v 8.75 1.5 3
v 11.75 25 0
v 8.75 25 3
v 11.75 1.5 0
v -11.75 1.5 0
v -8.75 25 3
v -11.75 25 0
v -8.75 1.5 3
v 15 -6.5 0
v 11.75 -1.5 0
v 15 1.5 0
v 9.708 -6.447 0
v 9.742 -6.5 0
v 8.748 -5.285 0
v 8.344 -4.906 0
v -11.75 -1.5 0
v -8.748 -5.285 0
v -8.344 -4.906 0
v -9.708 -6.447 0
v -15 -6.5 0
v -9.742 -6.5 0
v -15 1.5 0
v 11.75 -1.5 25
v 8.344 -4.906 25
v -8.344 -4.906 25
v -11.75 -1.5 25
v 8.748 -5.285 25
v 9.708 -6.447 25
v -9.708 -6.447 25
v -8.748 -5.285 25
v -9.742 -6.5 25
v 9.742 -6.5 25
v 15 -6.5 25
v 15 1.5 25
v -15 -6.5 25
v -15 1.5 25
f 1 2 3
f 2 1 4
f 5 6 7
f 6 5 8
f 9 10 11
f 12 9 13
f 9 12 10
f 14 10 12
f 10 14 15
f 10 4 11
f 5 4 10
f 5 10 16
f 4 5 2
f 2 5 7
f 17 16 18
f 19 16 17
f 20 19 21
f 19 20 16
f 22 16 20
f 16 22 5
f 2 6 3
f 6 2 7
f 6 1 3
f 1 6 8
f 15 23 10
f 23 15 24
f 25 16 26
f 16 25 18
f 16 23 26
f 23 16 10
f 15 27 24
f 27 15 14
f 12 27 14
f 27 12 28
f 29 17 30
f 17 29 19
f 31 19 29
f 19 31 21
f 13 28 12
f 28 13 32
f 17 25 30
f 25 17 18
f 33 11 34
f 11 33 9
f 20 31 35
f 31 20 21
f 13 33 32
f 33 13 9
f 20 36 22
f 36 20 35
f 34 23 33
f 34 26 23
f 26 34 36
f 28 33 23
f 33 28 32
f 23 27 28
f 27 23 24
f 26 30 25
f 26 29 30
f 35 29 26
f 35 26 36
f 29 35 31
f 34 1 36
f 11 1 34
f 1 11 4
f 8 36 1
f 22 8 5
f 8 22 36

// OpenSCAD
MOUNT_DIA = 130;
MOUNT_THICKNESS = 1;

MOUNT_HOLE_SPACING = 40;
MOUNT_HOLE_DIA = 3.5;

PUMP_DOVE_WIDTH = 23.5;
PUMP_DOVE_LENGTH = 27;
PUMP_DOVE_HEIGHT = 4;
PUMP_DOVE_SIDE = PUMP_DOVE_WIDTH/sqrt(2);

PUMP_DIA = 24;
PUMP_LENGTH = 42;

PUMP_MOUNT_WIDTH = 30;
PUMP_MOUNT_LENGTH = 25;
PUMP_MOUNT_HEIGHT = 5;

PUMP_MOUNT_OFFSET_X = 42;
PUMP_MOUNT_OFFSET_Y = 15;

$fn = 50;

module dove() {
  union() {
    intersection() {
      rotate([0, 45, 0])
      cube(size = [PUMP_DOVE_SIDE, PUMP_DOVE_LENGTH, PUMP_DOVE_SIDE], center = true);

      translate([0, 0, PUMP_DOVE_HEIGHT/2])
      cube(size = [PUMP_DOVE_WIDTH, PUMP_DOVE_LENGTH, PUMP_DOVE_HEIGHT], center = true);
    }

    translate([0, 0, PUMP_DIA/2])
    rotate([90, 0, 0])
    cylinder(d = PUMP_DIA, h = PUMP_LENGTH, center = true);

  }
}

module pump_mount() {
  difference() {
    translate([0, 0, PUMP_MOUNT_HEIGHT/2])
    cube(size = [PUMP_MOUNT_WIDTH, PUMP_MOUNT_LENGTH, PUMP_MOUNT_HEIGHT], center = true);
    dove();
  }
}

module upright_pump_mount() {
  wall_thickness = 3;
  union() {
    translate([0, PUMP_MOUNT_LENGTH/2, 0])
    difference() {
      translate([0, 0, wall_thickness/2])
      cube(size = [PUMP_MOUNT_WIDTH, PUMP_MOUNT_LENGTH, wall_thickness], center = true);
      pump_mount();
    }
    translate([0, 0, PUMP_MOUNT_LENGTH/2])
    rotate([90, 0, 0])
    union() {
      translate([0, 0, wall_thickness/2])
      pump_mount();
      cube(size = [PUMP_MOUNT_WIDTH, PUMP_MOUNT_LENGTH, wall_thickness], center = true);
    }
  }
}

module mount_base() {
  difference() {
    cylinder(d = MOUNT_DIA, h = MOUNT_THICKNESS);
    for(i = [-1, 1]) {
      for(j = [-1, 1]) {
        translate([i * MOUNT_HOLE_SPACING/2, j * MOUNT_HOLE_SPACING/2, 0])
        cylinder(d = MOUNT_HOLE_DIA, h = MOUNT_THICKNESS);
      }
    }
  }
}

//mount_base();
//translate([PUMP_MOUNT_OFFSET_X, PUMP_MOUNT_OFFSET_Y, MOUNT_THICKNESS])
//pump_mount();

upright_pump_mount();
